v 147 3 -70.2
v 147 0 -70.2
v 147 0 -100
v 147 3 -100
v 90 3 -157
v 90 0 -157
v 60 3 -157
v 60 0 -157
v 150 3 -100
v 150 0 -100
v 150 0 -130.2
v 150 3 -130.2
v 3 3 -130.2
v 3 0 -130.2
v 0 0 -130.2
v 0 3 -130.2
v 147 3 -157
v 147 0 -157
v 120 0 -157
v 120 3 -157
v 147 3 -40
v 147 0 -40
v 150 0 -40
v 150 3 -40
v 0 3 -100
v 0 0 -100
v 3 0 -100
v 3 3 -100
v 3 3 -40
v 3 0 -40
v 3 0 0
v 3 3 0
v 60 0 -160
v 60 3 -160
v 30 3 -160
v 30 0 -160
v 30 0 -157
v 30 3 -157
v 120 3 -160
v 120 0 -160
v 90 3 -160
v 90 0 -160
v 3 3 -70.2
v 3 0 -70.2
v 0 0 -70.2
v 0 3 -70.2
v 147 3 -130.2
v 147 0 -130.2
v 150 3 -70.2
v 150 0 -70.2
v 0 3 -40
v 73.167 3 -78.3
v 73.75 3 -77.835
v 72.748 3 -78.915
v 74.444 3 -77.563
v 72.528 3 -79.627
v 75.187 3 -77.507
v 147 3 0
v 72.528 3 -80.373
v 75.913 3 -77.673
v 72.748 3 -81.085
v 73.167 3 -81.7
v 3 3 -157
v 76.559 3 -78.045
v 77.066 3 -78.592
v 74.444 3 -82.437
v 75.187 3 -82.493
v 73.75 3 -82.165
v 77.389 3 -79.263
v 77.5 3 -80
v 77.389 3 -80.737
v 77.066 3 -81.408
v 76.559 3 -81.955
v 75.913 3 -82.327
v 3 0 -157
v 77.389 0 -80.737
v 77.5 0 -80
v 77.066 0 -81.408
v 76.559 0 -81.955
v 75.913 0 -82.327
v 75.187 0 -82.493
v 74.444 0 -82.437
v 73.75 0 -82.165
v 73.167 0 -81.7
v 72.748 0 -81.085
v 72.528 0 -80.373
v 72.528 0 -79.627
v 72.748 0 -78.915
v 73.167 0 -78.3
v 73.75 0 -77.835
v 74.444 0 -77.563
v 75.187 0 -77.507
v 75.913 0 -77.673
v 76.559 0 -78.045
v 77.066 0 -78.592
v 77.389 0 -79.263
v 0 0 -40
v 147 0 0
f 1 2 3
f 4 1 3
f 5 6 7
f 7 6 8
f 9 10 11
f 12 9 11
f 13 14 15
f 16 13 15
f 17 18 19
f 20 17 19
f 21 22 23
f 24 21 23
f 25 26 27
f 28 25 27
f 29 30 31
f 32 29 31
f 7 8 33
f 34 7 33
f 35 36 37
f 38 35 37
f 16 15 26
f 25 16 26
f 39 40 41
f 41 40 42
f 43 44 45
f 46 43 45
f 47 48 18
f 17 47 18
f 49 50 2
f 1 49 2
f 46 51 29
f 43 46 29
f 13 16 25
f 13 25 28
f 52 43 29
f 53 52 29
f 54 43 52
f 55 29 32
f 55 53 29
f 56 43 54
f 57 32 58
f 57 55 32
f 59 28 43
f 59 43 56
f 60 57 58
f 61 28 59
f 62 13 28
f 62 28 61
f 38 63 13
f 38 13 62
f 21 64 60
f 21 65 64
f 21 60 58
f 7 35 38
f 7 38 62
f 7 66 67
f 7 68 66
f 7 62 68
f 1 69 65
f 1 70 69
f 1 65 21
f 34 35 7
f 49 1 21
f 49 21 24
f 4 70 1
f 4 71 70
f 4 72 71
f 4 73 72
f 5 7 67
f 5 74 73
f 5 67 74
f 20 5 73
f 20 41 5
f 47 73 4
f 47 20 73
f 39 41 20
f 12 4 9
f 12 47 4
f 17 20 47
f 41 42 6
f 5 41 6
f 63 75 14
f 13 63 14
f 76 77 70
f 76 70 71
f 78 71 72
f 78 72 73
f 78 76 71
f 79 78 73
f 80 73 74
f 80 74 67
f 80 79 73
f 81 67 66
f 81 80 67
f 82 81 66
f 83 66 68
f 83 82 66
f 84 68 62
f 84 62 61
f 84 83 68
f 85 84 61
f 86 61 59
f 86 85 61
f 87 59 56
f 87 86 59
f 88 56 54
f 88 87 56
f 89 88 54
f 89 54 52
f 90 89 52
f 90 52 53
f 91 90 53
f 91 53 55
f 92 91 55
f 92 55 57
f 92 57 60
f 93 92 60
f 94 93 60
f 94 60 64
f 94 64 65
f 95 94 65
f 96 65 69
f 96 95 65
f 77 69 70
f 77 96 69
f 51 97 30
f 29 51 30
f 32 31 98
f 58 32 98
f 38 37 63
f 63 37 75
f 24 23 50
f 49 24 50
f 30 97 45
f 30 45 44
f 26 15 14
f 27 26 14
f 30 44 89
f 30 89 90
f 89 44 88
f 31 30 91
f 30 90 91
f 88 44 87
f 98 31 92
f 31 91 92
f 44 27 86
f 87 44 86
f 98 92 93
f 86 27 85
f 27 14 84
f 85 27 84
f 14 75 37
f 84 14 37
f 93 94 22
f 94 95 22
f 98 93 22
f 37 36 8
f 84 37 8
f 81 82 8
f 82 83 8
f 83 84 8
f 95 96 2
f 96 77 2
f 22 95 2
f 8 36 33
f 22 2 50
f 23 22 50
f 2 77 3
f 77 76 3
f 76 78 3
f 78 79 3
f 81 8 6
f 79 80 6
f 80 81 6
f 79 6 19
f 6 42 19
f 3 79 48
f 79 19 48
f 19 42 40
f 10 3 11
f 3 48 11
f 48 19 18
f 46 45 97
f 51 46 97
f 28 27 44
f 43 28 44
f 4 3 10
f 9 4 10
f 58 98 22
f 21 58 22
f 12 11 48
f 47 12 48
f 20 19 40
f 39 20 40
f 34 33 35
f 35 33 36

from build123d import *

# Parameters (mm, degrees)
SKETCH1_R           = 2.5
BOSS_EXTRUDE1_DEPTH = 3


with BuildPart() as part:
    # Sketch1 → Boss-Extrude1 (new body)
    with BuildSketch(Plane(origin=(0, 0, 0), x_dir=(1, 0, 0), z_dir=(0, 1, 0))):
        Polygon((150, 130.2), (147, 130.2), (147, 157), (120, 157), (120, 160), (90, 160), (90, 157), (60, 157), (60, 160), (30, 160), (30, 157), (3, 157), (3, 130.2), (0, 130.2), (0, 100), (3, 100), (3, 70.2), (0, 70.2), (0, 40), (3, 40), (3, 0), (147, 0), (147, 40), (150, 40), (150, 70.2), (147, 70.2), (147, 100), (150, 100), align=None)
        with Locations((75, 80)):
            Circle(SKETCH1_R, mode=Mode.SUBTRACT)
    extrude(amount=BOSS_EXTRUDE1_DEPTH)


solid = part.part
